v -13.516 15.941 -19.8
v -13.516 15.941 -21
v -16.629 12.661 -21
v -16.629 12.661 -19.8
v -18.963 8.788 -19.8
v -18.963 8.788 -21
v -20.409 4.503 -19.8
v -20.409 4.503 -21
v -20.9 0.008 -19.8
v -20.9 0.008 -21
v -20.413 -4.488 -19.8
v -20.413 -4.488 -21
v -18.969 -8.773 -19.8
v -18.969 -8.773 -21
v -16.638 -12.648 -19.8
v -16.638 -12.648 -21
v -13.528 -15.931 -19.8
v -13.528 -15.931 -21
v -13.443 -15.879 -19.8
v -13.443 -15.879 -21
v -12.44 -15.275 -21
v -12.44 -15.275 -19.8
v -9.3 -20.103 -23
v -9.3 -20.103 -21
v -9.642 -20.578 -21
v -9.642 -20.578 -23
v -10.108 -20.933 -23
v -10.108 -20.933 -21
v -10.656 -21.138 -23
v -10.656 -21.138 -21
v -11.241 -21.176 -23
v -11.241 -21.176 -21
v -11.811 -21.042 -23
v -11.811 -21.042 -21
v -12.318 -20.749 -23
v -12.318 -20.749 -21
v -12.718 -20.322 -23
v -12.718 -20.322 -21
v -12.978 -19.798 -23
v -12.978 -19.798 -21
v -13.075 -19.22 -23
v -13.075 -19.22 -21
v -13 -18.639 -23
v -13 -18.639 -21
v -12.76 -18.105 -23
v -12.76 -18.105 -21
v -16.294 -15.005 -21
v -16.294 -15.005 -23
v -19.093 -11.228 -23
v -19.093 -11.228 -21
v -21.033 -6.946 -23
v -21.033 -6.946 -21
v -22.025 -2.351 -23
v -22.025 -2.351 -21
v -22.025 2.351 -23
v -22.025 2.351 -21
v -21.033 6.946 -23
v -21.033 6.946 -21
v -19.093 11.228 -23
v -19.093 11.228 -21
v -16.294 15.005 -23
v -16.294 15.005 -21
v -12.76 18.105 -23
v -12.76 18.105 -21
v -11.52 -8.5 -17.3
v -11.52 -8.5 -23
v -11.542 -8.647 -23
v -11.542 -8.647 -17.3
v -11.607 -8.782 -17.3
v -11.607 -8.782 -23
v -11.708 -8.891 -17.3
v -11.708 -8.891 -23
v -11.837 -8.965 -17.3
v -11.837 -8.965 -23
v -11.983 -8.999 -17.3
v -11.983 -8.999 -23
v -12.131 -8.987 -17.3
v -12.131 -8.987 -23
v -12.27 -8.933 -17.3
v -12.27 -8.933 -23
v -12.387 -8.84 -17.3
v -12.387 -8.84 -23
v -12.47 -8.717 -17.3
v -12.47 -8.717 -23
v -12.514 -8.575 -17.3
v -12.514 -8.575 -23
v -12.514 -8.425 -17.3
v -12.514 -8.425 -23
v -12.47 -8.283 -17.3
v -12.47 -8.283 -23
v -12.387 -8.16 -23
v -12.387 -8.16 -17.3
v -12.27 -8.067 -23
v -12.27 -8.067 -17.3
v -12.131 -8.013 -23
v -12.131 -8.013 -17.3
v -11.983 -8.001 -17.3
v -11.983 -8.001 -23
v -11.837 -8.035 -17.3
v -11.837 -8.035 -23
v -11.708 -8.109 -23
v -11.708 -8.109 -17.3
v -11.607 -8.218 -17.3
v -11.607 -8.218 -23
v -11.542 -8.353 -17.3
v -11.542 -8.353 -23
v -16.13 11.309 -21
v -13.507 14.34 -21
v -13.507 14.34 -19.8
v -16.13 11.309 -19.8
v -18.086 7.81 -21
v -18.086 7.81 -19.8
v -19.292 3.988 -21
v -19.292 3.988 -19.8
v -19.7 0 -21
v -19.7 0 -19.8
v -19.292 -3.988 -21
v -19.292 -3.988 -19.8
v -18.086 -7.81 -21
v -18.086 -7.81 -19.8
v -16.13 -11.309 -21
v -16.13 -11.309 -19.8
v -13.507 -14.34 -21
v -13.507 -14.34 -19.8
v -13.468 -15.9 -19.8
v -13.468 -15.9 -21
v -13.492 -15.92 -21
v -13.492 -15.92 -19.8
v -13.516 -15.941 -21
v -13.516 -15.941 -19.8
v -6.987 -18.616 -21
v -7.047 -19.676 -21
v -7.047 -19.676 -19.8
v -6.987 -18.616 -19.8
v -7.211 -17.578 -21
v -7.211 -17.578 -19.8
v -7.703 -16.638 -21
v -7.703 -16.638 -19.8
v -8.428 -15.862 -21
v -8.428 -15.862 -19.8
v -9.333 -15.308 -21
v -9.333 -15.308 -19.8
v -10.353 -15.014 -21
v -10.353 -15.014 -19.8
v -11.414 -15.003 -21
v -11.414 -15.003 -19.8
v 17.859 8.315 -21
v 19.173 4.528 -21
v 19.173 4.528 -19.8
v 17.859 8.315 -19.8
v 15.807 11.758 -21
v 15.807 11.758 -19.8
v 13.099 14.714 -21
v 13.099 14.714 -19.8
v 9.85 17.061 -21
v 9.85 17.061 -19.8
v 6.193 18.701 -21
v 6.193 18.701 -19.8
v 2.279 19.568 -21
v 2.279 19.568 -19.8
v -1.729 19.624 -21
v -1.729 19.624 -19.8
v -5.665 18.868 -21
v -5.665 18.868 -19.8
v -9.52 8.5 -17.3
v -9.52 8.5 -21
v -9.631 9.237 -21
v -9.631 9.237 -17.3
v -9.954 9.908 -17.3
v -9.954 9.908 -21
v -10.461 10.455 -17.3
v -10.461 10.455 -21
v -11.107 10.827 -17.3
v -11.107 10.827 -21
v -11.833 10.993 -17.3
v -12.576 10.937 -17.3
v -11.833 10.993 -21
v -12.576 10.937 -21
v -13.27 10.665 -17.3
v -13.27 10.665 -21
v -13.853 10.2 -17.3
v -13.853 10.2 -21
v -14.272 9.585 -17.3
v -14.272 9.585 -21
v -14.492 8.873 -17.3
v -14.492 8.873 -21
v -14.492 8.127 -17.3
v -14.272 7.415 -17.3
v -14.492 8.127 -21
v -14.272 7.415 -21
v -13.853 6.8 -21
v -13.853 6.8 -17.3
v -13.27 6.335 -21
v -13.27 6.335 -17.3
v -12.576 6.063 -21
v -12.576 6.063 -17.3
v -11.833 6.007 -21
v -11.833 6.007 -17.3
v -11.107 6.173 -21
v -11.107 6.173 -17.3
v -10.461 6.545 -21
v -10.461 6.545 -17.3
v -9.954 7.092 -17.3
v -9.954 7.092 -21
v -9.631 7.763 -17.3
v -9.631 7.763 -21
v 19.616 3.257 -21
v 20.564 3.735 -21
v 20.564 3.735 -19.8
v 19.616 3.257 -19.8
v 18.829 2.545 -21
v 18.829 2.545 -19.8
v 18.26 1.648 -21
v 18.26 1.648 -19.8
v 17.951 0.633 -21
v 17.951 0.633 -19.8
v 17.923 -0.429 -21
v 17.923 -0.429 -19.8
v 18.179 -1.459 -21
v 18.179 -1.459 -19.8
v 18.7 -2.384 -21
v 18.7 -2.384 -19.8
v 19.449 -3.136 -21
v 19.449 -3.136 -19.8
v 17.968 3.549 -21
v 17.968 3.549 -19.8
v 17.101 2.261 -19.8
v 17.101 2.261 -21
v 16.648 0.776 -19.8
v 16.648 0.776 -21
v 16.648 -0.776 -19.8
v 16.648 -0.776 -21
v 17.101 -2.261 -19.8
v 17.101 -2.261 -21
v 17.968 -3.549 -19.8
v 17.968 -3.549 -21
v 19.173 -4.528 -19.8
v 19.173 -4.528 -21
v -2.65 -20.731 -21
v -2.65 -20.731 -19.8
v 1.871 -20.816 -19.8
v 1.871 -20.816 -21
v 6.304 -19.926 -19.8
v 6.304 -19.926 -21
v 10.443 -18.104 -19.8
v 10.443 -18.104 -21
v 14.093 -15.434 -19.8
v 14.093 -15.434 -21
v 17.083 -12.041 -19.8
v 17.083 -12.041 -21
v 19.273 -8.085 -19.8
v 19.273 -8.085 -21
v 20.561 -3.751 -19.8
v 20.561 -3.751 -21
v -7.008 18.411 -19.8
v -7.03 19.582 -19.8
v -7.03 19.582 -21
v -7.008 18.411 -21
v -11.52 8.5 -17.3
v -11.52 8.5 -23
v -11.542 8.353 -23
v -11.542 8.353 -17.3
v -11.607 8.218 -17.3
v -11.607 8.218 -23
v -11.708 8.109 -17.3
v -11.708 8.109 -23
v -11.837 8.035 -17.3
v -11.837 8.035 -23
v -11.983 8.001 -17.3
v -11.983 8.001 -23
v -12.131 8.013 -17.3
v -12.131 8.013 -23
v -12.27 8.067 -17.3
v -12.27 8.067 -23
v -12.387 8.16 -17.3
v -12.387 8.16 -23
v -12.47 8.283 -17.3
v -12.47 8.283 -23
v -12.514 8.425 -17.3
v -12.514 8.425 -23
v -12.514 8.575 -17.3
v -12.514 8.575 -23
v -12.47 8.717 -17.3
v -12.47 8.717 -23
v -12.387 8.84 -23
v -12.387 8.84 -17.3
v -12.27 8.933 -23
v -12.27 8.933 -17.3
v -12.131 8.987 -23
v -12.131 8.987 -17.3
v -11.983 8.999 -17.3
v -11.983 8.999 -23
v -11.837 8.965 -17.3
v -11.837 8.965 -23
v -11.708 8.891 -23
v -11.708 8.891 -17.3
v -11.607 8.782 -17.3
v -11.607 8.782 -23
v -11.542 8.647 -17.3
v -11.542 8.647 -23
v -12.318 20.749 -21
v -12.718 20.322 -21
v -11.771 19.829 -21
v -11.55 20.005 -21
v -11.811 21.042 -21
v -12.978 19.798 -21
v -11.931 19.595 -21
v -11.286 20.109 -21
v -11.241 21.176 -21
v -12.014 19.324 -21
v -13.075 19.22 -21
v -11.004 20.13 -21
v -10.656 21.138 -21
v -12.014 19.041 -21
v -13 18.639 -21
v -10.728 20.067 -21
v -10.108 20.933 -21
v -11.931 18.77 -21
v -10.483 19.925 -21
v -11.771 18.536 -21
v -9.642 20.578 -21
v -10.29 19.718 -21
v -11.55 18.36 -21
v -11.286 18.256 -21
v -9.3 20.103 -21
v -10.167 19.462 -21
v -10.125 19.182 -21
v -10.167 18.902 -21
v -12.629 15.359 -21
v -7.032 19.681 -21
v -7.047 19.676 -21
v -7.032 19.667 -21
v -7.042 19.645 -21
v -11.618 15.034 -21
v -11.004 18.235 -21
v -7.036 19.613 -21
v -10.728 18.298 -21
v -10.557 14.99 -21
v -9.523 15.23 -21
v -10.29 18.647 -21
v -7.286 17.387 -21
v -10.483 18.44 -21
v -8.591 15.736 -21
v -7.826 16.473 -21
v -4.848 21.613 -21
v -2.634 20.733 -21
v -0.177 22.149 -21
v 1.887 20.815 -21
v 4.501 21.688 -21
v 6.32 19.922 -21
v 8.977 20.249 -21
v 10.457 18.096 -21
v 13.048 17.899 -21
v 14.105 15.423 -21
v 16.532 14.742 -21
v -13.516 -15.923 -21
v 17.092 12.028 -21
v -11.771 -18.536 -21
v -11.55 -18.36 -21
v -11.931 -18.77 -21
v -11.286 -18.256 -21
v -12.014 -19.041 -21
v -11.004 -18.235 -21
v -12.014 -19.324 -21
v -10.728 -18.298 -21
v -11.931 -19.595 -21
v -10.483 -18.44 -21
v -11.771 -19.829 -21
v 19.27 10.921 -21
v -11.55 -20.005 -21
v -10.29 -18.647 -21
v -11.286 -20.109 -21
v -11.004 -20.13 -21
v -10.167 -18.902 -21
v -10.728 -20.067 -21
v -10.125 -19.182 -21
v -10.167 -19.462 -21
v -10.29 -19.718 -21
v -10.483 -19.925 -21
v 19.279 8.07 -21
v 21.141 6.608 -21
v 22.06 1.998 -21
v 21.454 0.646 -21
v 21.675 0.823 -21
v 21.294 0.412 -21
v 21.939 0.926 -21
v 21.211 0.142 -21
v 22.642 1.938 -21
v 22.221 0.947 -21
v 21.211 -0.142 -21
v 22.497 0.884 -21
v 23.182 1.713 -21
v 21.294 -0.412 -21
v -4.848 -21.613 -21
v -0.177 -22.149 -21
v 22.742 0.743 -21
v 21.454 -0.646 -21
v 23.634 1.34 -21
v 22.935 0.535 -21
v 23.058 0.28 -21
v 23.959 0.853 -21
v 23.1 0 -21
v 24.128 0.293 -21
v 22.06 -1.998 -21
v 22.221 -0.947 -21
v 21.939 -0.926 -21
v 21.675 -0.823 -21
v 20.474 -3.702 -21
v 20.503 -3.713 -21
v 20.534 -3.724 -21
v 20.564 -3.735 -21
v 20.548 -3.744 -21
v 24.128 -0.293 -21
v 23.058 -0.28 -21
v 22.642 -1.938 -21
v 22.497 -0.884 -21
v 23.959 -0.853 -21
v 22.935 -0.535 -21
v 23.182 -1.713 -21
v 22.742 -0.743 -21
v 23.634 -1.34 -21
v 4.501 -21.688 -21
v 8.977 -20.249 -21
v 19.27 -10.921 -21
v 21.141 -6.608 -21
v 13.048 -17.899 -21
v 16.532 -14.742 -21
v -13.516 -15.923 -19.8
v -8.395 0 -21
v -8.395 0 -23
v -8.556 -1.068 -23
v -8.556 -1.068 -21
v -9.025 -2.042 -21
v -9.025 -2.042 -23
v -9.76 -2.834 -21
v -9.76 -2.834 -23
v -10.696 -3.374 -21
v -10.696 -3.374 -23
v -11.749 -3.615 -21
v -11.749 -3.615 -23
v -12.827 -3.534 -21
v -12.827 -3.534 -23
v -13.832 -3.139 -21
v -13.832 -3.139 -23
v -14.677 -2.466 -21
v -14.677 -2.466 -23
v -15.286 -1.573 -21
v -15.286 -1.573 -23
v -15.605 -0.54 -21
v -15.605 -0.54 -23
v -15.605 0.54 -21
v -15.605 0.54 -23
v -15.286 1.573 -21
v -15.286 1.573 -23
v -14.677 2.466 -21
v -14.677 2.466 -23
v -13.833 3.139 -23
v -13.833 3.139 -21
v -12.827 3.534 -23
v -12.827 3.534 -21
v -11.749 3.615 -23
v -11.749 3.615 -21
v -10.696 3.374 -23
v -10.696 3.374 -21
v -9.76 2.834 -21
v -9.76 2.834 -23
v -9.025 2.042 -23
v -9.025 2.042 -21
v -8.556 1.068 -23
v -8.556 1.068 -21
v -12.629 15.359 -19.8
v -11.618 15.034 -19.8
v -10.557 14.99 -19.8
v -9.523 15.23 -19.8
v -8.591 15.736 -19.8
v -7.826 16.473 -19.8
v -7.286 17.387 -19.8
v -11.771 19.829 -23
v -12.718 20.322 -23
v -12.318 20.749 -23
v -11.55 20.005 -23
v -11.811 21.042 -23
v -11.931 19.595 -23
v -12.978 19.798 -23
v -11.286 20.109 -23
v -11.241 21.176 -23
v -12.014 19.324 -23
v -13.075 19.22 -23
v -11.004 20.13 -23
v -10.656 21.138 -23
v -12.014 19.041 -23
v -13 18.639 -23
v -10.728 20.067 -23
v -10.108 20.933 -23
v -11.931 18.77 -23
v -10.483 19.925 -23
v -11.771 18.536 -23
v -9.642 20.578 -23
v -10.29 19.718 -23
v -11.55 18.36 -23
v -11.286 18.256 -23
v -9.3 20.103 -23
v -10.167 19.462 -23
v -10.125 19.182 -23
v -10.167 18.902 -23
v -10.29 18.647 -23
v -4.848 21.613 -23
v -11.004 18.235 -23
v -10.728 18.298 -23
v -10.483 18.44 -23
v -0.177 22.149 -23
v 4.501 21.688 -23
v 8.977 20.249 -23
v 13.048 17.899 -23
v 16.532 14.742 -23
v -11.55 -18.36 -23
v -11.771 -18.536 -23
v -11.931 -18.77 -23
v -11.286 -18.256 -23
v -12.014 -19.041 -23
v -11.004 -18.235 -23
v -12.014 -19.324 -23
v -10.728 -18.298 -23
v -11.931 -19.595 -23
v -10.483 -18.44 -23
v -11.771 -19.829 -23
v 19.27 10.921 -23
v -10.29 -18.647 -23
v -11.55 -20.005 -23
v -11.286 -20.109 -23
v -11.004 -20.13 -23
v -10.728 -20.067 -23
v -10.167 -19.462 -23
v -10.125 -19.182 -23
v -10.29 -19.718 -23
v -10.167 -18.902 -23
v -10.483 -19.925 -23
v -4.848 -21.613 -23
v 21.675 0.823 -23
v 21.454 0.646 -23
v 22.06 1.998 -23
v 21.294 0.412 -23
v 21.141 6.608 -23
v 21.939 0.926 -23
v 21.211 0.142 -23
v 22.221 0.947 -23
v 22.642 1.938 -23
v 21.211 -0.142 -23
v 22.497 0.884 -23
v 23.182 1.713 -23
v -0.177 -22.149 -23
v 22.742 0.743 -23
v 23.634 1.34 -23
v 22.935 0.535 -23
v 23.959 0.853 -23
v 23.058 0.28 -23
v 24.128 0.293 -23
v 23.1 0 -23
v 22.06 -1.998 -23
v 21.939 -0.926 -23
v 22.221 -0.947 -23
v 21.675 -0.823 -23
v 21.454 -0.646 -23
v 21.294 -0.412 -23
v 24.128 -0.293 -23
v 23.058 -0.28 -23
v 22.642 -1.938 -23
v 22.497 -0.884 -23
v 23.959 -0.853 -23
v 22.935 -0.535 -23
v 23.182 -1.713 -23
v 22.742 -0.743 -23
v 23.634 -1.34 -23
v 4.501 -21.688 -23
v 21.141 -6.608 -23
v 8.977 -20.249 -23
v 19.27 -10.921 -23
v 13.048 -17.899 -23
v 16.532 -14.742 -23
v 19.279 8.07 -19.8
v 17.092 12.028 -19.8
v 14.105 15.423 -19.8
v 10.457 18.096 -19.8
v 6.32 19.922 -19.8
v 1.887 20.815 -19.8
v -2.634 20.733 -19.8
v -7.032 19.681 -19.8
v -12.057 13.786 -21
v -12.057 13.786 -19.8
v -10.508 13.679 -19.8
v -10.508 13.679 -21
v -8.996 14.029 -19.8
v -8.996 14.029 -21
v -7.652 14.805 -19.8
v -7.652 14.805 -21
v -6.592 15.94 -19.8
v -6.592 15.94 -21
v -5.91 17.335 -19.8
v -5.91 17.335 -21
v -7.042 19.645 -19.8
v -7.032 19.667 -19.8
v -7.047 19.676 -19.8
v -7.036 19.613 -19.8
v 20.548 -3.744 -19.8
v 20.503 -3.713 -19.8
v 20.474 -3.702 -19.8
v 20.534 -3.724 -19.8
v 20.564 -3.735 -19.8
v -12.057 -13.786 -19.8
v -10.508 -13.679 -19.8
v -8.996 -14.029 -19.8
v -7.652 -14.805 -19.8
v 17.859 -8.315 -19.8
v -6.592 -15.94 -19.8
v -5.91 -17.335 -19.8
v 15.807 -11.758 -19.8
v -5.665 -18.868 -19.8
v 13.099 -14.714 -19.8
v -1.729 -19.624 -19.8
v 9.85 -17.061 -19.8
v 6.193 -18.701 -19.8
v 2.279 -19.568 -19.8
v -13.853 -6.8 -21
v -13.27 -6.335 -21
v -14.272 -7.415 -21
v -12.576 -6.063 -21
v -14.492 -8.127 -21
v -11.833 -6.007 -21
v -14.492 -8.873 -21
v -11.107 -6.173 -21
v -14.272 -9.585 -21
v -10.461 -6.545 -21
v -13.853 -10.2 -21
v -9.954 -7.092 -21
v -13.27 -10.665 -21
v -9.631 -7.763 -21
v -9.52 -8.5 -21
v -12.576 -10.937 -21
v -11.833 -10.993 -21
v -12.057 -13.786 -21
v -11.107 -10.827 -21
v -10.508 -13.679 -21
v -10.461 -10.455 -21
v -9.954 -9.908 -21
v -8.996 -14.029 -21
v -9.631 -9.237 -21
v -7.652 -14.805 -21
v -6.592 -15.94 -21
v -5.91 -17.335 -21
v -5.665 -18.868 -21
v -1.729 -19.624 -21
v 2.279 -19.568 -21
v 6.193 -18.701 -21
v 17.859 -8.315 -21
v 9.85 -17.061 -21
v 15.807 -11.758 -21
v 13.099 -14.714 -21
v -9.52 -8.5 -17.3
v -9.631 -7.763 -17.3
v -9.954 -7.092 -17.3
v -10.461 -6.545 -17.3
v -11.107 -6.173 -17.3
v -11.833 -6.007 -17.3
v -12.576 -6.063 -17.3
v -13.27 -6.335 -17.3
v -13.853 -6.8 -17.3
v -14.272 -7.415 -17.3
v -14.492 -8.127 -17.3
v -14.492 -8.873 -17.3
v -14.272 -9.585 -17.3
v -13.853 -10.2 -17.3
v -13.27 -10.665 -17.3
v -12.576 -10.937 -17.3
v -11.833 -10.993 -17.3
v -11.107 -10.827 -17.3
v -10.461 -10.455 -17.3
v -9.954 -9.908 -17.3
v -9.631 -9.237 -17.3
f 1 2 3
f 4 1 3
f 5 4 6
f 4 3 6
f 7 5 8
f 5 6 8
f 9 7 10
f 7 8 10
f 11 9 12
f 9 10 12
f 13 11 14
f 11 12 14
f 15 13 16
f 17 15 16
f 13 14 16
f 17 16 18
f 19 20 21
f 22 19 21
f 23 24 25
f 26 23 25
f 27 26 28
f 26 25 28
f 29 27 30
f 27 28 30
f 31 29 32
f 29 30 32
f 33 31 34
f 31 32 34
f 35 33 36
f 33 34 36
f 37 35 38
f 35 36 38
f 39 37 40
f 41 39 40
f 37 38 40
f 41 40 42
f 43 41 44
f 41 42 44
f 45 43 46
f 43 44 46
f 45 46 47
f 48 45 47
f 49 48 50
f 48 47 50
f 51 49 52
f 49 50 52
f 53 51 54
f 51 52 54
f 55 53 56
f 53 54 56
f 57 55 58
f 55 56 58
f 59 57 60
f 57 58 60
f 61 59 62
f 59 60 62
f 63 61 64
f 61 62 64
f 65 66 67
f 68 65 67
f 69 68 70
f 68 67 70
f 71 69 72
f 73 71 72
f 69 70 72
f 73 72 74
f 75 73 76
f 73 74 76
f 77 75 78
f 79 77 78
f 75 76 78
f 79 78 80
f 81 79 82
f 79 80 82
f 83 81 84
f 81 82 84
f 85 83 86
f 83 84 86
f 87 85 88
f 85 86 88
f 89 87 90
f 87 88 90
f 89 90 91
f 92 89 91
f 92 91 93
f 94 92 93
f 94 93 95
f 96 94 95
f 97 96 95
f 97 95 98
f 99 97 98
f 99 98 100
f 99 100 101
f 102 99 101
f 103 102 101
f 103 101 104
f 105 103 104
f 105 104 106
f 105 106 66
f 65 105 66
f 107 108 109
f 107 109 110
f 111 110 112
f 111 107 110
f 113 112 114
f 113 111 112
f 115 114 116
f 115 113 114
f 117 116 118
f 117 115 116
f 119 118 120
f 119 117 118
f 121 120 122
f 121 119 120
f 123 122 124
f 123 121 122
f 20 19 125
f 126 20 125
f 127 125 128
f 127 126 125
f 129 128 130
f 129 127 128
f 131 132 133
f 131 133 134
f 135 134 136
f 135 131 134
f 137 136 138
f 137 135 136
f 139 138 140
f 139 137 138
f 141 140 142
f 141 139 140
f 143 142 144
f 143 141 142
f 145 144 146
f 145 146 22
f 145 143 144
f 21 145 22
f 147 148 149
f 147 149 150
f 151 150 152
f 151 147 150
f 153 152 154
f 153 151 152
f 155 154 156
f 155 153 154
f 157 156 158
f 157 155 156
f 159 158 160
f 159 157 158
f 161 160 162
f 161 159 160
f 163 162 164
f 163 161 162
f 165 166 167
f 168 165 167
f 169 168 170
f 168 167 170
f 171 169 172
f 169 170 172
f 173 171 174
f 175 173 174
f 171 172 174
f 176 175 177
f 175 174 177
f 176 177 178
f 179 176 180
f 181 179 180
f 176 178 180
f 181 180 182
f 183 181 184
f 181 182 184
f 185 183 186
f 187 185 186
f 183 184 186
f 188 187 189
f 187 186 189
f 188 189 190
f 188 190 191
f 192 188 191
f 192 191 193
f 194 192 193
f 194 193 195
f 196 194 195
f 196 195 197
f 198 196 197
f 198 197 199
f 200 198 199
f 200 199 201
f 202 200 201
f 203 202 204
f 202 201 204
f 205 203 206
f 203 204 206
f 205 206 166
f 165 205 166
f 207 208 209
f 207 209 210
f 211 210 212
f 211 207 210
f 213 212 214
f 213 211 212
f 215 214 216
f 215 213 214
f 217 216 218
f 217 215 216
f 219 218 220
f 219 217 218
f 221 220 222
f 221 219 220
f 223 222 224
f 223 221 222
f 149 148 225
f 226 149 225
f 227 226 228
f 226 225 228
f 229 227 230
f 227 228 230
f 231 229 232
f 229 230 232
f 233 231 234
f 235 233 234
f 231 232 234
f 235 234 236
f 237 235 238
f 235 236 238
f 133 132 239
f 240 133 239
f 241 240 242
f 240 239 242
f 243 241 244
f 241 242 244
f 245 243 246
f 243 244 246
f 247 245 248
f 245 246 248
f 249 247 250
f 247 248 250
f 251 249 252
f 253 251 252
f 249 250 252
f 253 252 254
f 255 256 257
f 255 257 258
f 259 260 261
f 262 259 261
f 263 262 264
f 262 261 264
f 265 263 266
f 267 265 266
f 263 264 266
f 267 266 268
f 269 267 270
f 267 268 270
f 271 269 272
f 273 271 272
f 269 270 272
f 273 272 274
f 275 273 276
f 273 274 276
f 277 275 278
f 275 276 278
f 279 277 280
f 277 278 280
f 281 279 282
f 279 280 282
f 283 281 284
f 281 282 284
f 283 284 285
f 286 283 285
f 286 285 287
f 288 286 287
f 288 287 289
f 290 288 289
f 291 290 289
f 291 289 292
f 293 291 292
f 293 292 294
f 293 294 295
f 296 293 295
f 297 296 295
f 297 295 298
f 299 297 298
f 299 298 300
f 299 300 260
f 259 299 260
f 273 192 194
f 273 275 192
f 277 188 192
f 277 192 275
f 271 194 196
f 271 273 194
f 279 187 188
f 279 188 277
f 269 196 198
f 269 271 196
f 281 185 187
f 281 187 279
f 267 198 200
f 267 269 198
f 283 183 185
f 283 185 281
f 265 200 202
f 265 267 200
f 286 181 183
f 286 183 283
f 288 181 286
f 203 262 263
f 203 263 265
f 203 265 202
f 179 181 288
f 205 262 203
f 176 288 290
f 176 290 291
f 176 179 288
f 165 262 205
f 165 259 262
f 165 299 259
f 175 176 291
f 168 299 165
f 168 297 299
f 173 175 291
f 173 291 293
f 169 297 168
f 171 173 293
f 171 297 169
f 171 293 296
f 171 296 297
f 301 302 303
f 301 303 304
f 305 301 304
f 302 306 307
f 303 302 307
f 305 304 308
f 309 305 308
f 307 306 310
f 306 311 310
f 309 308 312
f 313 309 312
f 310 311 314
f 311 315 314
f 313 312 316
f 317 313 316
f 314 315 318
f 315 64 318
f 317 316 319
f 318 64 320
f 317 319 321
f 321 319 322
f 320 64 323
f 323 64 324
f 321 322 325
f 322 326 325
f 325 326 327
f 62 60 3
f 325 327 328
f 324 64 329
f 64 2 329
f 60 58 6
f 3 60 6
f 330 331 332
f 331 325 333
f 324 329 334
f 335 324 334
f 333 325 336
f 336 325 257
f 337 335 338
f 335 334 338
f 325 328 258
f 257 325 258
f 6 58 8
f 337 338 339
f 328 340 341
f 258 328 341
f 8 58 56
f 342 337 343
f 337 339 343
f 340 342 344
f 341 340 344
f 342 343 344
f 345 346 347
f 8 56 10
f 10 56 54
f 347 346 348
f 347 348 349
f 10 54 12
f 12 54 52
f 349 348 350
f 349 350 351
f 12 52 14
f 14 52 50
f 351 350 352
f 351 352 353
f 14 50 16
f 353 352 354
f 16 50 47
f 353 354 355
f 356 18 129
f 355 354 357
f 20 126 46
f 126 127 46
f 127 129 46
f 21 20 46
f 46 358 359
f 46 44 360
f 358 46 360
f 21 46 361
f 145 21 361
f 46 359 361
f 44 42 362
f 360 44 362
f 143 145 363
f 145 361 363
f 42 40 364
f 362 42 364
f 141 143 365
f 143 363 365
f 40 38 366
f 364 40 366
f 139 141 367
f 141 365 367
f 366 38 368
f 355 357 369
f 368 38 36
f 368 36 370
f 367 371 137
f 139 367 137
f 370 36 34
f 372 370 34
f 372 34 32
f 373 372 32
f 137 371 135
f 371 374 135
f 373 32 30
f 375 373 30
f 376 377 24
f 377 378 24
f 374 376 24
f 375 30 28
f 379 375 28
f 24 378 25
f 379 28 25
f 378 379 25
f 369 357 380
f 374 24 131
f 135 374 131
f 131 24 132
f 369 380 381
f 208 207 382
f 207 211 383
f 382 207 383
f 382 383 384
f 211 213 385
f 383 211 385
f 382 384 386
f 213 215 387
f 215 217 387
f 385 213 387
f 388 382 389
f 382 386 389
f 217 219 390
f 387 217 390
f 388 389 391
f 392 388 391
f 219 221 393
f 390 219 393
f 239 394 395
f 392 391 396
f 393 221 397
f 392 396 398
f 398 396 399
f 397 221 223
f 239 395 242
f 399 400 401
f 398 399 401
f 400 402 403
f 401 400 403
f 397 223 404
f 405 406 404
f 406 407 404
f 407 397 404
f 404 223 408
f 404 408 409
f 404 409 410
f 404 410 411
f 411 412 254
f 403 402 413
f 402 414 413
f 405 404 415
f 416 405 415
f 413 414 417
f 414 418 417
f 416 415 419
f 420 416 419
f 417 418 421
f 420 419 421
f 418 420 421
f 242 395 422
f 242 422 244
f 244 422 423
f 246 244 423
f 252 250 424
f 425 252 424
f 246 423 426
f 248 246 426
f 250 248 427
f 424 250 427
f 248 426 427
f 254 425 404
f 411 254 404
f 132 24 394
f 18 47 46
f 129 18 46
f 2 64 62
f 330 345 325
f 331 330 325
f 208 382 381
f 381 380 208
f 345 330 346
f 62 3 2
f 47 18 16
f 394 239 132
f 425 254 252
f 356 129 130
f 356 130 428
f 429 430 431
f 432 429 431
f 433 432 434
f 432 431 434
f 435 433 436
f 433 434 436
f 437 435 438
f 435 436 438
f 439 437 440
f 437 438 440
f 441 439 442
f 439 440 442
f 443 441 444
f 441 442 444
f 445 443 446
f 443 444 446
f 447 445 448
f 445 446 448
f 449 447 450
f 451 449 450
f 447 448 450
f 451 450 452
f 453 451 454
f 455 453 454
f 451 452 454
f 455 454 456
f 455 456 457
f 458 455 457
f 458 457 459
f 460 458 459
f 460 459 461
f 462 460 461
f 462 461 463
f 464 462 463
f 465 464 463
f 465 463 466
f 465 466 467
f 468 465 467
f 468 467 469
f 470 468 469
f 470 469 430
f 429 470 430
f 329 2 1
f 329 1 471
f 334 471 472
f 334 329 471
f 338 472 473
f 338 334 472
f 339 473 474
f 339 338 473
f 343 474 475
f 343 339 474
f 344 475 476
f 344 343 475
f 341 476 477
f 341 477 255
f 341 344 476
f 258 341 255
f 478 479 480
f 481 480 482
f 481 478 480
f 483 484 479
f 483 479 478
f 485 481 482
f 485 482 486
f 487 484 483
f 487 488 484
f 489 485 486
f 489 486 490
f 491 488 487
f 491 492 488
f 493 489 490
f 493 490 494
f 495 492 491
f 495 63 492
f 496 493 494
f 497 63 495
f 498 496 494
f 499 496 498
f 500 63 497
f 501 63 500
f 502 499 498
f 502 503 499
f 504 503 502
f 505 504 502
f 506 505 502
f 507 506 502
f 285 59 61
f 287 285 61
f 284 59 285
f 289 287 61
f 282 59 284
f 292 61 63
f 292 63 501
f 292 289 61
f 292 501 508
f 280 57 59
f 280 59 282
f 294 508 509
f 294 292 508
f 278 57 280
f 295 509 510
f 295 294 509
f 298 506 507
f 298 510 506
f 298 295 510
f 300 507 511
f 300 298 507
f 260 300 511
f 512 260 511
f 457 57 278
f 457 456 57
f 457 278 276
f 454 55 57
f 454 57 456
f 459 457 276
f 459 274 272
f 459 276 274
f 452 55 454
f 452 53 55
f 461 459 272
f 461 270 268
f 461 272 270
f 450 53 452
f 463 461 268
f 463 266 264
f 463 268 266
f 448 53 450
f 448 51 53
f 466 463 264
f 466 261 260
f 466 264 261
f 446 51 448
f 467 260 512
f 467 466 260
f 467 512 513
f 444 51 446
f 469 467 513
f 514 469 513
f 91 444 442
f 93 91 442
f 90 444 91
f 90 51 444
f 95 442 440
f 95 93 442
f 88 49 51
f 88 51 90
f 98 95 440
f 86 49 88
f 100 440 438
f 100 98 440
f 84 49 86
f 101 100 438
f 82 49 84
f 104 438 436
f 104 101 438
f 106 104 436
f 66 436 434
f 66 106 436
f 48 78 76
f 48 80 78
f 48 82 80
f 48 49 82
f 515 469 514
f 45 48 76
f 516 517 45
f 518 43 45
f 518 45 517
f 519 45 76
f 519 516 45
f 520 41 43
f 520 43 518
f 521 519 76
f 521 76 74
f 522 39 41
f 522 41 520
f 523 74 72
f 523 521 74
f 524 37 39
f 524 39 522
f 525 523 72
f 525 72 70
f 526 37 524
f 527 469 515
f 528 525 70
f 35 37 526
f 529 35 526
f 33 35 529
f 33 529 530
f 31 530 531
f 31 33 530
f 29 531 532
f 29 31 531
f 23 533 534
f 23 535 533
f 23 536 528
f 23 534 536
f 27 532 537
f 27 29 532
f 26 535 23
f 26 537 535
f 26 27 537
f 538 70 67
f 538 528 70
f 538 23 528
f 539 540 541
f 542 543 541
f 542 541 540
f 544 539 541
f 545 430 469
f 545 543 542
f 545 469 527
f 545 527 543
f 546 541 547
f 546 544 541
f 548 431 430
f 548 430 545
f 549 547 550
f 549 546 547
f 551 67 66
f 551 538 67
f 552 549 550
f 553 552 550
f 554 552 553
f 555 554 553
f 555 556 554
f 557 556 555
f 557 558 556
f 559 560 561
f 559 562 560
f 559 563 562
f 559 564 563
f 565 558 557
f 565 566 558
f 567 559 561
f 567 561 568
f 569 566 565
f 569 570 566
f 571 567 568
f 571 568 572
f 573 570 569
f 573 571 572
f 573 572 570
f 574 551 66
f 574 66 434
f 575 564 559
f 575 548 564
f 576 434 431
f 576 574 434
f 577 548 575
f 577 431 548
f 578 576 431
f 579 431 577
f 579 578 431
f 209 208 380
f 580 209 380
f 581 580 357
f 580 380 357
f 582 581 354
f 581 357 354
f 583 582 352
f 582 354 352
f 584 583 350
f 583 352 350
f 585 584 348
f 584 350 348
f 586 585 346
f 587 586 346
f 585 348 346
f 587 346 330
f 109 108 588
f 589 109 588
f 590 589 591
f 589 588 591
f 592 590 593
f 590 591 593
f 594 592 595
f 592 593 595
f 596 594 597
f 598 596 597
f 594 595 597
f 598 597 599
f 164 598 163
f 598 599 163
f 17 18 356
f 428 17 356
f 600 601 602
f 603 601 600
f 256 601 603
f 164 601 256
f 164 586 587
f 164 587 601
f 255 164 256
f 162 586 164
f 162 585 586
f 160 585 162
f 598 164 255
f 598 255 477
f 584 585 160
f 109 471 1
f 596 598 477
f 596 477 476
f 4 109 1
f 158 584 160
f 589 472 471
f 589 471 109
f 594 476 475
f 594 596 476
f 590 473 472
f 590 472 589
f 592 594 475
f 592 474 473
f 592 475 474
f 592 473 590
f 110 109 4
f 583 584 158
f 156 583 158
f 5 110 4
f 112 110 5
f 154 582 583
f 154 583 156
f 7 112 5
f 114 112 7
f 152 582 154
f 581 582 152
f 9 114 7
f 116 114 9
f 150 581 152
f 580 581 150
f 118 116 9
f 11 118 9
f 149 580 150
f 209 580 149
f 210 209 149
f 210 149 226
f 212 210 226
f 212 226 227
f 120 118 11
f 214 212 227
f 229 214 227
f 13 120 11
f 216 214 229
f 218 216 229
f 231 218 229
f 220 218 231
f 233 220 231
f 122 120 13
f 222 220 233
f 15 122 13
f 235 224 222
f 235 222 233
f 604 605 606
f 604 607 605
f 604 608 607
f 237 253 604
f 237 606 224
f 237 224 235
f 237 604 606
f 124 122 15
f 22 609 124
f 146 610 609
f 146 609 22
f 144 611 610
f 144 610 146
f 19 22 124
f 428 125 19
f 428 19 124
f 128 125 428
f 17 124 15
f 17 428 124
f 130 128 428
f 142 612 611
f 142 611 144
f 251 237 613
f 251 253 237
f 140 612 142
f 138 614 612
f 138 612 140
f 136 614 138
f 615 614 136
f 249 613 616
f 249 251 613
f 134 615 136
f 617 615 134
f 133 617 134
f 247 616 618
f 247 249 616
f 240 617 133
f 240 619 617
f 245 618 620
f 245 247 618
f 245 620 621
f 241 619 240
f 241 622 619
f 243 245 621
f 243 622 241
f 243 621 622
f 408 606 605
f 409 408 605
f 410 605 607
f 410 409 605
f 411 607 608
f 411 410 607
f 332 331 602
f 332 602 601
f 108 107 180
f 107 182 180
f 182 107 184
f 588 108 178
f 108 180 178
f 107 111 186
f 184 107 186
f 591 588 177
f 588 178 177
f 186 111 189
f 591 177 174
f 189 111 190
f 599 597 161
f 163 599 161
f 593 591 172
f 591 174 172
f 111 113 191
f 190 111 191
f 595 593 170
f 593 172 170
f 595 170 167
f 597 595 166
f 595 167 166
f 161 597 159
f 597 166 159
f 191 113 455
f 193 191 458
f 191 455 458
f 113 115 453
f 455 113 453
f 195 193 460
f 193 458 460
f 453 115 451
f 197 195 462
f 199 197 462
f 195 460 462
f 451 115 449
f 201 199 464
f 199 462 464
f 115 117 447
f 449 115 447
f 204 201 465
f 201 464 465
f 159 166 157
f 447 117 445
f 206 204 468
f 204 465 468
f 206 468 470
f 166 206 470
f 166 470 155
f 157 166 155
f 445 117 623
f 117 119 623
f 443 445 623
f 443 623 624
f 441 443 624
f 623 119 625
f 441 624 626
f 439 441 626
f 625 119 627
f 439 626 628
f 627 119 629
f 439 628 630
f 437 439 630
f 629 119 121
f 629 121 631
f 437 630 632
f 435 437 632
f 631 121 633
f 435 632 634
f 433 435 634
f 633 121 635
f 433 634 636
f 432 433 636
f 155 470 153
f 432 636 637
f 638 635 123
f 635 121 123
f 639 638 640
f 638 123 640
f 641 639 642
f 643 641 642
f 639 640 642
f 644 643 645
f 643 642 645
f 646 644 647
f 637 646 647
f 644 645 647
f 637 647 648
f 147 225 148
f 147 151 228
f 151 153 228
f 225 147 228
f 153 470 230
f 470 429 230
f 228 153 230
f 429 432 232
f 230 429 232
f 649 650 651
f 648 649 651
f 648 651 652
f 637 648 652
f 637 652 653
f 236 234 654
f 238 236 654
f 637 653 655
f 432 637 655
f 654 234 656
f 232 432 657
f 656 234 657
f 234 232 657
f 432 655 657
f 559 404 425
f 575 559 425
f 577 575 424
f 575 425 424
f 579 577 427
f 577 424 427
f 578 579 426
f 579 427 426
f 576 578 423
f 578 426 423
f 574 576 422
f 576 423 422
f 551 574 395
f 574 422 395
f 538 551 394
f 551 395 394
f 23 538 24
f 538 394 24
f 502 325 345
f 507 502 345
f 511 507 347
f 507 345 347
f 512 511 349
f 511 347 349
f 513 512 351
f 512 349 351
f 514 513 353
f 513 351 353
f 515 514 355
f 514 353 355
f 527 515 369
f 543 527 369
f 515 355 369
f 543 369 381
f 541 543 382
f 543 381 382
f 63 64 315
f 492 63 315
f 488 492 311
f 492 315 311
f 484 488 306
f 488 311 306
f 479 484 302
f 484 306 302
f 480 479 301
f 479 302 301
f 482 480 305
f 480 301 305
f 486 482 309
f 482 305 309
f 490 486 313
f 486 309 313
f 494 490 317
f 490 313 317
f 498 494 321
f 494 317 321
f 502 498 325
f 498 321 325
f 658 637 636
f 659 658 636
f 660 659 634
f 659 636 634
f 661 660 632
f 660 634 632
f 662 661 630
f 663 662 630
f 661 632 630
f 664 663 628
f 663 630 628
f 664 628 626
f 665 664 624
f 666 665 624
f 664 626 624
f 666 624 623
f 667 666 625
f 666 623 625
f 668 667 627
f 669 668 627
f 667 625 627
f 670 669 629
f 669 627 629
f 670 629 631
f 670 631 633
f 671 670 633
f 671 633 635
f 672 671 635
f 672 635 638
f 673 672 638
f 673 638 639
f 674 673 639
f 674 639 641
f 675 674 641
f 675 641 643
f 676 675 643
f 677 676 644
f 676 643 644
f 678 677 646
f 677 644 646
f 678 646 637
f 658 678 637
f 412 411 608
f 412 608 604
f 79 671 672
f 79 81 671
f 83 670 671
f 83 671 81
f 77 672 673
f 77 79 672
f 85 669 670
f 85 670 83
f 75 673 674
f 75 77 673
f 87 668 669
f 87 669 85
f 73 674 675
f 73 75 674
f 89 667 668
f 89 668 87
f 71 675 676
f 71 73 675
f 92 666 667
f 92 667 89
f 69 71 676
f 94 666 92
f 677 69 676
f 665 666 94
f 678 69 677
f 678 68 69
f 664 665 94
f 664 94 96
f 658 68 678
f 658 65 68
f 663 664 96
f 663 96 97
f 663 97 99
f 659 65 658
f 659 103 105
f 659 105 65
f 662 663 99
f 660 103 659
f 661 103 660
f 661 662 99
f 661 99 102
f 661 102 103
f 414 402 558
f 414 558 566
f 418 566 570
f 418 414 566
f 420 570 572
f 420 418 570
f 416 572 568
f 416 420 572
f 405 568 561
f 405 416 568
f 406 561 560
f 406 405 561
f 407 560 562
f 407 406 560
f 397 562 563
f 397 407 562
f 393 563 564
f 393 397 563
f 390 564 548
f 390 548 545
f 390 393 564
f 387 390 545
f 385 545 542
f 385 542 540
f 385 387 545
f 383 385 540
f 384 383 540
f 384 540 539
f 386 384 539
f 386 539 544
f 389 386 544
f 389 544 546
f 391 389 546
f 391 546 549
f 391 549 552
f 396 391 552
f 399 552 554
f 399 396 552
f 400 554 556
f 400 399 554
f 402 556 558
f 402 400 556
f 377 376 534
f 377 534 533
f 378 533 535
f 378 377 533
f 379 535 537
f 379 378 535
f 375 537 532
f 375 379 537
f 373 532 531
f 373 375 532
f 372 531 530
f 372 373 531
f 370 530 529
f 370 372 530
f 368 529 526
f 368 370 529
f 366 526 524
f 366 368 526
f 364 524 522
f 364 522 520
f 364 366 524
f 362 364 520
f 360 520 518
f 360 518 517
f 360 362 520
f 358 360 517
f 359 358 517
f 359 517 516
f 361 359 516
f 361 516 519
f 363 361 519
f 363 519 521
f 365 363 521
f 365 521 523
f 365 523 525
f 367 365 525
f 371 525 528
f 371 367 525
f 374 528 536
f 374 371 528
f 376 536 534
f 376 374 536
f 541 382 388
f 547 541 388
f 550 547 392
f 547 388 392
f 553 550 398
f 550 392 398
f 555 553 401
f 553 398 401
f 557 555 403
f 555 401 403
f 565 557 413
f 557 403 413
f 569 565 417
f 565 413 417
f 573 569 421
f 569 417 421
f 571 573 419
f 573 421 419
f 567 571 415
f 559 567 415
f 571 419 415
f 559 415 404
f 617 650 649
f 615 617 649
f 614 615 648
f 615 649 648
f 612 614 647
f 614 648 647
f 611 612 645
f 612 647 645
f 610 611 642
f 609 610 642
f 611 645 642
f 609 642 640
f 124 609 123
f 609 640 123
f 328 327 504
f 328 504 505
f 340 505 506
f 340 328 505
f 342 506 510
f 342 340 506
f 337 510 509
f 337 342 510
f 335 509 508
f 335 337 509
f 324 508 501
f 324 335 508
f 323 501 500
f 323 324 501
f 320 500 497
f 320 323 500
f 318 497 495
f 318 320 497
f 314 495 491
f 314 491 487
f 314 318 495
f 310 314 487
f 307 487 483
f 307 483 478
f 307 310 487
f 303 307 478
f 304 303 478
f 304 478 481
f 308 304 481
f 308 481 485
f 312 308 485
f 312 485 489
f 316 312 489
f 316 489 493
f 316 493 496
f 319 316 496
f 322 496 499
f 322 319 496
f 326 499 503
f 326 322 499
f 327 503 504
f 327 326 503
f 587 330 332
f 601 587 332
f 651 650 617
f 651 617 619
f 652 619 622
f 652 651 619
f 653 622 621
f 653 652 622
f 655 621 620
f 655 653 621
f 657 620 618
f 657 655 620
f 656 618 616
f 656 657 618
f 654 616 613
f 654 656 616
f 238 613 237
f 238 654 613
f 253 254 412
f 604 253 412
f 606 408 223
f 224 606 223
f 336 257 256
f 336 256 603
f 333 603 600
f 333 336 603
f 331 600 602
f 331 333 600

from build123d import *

# Parameters (mm, degrees)
SKETCH007_R        = 0.95
PAD003_DEPTH       = 2
PAD004_DEPTH       = 1.2
POLARPATTERN_COUNT = 3
SKETCH013_R        = 2.5
PAD006_DEPTH       = 3.7
SKETCH011_R        = 3.625
SKETCH011_R_2      = 0.5
POCKET003_DEPTH    = 5.701


with BuildPart() as part:
    # Sketch007 (on DatumPlane) → Pad003 (new body)
    with BuildSketch(Plane(origin=(0, 0, -21), x_dir=(1, 0, 0), z_dir=(0, 0, -1))):
        with BuildLine():
            ThreePointArc((22.059707, 1.997961), (11.075, 19.182463), (-9.299569, 20.103247))
            ThreePointArc((-9.299569, 20.103247), (-12.075, 20.914514), (-12.760138, 18.105286))
            ThreePointArc((-12.760138, 18.105286), (-22.15, 0), (-12.760138, -18.105286))
            ThreePointArc((-12.760138, -18.105286), (-12.075, -20.914514), (-9.299569, -20.103247))
            ThreePointArc((-9.299569, -20.103247), (11.075, -19.182463), (22.059707, -1.997961))
            ThreePointArc((22.059707, -1.997961), (24.15, 0), (22.059707, 1.997961))
        make_face()
        with Locations((22.15, 0)):
            Circle(SKETCH007_R, mode=Mode.SUBTRACT)
        with Locations((-11.075, 19.182463)):
            Circle(SKETCH007_R, mode=Mode.SUBTRACT)
        with Locations((-11.075, -19.182463)):
            Circle(SKETCH007_R, mode=Mode.SUBTRACT)
    extrude(amount=PAD003_DEPTH)

    # Sketch008 (on DatumPlane) → Pad004 (join)
    with BuildSketch(Plane.XY.offset(-21)):
        with BuildLine():
            ThreePointArc((20.563616, 3.734664), (10.457001, 18.095887), (-7.03227, 19.681392))
            Line((-7.03227, 19.681392), (-7.008244, 18.41126))
            ThreePointArc((19.172652, 4.527627), (9.229411, 17.404252), (-7.008244, 18.41126))
            ThreePointArc((19.172652, 4.527627), (16.59, 0), (19.172652, -4.527627))
            Line((20.563616, -3.734664), (19.172652, -4.527627))
            ThreePointArc((20.563616, 3.734664), (17.9, 0), (20.563616, -3.734664))
        make_face()
    pad004 = extrude(amount=PAD004_DEPTH)

    # PolarPattern: Pad004 ×3 about axis
    polarpattern_axis = Axis((0, 0, -21), (0, 0, 1))
    for i in range(1, POLARPATTERN_COUNT):
        add(pad004.rotate(polarpattern_axis, i * 360 / POLARPATTERN_COUNT))

    # Sketch013 (on DatumPlane) → Pad006 (join)
    with BuildSketch(Plane.XY.offset(-21)):
        with Locations((-12.02, 8.5)):
            Circle(SKETCH013_R)
        with Locations((-12.02, -8.5)):
            Circle(SKETCH013_R)
    extrude(amount=PAD006_DEPTH)

    # Sketch011 (on DatumPlane) → Pocket003 (cut, through all)
    with BuildSketch(Plane(origin=(0, 0, -23), x_dir=(1, 0, 0), z_dir=(0, 0, -1))):
        with Locations((-12.02, 0)):
            Circle(SKETCH011_R)
        with Locations((-12.02, 8.5)):
            Circle(SKETCH011_R_2)
        with Locations((-12.02, -8.5)):
            Circle(SKETCH011_R_2)
    extrude(amount=-POCKET003_DEPTH, mode=Mode.SUBTRACT)


solid = part.part
